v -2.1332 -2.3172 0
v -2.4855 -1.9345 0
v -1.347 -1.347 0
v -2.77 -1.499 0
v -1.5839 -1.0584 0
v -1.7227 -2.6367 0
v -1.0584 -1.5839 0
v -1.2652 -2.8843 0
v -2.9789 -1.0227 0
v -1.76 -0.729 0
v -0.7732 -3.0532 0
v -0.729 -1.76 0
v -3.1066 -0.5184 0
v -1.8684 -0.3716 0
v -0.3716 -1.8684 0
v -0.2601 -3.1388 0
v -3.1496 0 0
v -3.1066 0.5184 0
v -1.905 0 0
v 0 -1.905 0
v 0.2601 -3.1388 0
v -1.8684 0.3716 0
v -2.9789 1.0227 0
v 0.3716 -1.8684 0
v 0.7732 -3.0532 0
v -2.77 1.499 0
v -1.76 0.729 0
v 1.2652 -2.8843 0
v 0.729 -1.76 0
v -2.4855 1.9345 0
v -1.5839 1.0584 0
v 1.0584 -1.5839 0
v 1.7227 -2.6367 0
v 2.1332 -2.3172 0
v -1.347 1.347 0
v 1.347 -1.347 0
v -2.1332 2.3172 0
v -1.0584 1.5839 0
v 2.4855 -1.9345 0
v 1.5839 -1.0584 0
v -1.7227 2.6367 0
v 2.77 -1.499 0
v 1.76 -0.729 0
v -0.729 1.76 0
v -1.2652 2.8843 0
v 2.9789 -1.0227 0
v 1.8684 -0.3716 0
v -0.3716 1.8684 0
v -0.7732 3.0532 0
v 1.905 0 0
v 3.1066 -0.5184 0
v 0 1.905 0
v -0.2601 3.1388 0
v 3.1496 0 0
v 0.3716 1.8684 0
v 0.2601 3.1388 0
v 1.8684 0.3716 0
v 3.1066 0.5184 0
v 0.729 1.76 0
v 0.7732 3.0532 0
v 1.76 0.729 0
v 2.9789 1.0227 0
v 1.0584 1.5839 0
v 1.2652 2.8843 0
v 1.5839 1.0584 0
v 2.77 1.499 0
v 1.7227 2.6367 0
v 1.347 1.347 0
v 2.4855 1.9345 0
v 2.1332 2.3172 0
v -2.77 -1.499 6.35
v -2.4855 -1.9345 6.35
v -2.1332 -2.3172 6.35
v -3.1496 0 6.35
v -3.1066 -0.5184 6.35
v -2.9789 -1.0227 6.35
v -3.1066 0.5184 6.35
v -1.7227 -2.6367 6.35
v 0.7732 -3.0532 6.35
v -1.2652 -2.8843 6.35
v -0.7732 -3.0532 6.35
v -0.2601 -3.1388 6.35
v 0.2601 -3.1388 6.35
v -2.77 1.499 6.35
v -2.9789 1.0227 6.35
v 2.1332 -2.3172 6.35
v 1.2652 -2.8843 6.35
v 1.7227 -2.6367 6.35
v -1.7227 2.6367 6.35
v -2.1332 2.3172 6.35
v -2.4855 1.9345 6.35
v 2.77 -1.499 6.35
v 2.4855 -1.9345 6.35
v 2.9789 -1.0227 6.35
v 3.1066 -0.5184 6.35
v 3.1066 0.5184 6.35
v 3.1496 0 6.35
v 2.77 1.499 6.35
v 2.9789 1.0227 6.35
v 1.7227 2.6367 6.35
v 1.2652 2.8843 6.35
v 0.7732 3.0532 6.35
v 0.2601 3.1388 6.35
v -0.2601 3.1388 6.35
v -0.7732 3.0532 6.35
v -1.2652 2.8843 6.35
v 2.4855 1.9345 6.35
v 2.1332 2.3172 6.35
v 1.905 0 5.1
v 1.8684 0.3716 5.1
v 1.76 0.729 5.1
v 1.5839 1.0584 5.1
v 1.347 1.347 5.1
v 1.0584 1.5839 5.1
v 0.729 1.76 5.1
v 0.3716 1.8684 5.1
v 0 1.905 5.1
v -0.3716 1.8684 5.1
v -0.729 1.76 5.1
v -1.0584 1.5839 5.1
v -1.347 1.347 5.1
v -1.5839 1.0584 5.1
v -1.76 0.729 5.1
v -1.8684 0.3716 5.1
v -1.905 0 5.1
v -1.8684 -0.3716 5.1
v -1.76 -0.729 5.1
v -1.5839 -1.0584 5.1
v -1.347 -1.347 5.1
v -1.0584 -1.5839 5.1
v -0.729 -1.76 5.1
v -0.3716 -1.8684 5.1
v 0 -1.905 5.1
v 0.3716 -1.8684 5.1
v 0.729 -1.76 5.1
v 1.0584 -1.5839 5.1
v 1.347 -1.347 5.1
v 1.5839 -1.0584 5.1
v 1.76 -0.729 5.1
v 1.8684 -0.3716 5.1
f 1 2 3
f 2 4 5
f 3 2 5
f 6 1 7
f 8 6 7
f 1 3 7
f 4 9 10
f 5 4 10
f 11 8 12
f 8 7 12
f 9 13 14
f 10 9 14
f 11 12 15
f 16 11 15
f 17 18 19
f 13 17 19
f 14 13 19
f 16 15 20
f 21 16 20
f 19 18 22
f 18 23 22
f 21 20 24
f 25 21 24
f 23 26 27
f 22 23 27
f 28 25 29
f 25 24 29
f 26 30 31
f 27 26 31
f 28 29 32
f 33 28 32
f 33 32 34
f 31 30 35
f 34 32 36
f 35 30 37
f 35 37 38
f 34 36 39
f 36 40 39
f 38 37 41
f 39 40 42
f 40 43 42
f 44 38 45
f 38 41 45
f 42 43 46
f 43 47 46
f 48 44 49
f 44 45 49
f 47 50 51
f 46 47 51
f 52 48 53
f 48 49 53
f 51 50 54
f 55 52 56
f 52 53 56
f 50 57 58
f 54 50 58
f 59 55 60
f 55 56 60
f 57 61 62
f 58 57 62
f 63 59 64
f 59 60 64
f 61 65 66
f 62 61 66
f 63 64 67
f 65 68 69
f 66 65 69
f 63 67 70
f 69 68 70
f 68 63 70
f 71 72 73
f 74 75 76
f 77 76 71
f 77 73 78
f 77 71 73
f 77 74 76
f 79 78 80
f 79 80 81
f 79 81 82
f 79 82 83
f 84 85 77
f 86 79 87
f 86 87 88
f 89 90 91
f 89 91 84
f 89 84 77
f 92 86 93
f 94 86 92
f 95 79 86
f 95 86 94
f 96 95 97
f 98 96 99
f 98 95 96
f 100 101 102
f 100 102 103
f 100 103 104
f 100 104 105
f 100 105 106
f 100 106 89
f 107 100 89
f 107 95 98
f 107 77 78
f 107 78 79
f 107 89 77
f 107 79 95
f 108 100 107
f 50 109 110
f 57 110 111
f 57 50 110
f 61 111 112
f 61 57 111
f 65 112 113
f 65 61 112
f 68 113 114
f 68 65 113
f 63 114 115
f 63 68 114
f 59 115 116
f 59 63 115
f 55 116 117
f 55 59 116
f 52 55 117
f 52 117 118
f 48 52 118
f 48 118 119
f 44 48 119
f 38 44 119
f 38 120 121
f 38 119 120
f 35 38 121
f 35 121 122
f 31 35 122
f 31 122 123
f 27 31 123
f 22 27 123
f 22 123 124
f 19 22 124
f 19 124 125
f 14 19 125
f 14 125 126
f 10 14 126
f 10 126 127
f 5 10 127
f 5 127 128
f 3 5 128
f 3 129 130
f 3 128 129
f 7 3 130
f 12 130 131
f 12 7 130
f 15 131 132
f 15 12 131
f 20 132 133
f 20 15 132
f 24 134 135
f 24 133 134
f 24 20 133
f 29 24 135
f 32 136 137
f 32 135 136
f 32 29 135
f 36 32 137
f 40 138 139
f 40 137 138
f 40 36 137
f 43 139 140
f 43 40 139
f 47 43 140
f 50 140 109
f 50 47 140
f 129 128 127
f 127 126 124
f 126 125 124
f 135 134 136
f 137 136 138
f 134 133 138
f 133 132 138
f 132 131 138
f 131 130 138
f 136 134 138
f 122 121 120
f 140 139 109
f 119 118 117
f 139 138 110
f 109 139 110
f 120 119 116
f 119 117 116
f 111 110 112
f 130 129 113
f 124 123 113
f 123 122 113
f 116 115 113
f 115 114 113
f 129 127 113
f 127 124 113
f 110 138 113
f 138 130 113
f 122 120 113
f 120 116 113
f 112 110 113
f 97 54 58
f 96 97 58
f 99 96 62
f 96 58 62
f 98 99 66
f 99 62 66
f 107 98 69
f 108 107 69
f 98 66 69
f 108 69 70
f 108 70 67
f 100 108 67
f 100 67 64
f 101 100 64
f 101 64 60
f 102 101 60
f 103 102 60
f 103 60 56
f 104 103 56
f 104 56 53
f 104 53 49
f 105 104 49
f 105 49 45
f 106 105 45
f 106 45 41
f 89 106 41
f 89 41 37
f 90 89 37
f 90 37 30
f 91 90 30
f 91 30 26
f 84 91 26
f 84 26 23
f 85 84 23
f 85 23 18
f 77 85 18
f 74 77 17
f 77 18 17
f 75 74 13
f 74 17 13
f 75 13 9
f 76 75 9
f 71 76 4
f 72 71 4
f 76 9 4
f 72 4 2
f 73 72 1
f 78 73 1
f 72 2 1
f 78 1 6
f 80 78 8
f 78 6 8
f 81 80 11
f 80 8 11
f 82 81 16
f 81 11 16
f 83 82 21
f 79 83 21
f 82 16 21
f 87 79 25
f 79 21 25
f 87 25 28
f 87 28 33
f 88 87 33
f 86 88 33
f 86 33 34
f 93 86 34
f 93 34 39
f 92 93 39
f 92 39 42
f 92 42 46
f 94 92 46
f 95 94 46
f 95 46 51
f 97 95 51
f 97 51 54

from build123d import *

# Parameters (mm, degrees)
F0_R     = 3.1496
F0_R_2   = 1.905
F1_DEPTH = 1.778
F2_DEPTH = 6.35
F3_R     = 3.070911
F4_DEPTH = 1.25


with BuildPart() as f1:
    # F0 (on Top) → F1 (new body)
    with BuildSketch(Plane.XY):
        Circle(F0_R)
        Circle(F0_R_2, mode=Mode.SUBTRACT)
    extrude(amount=F1_DEPTH)

    # F0 (on Top) → F2 (join)
    with BuildSketch(Plane.XY):
        Circle(F0_R)
        Circle(F0_R_2, mode=Mode.SUBTRACT)
    extrude(amount=F2_DEPTH)

    # F3 (on face) → F4 (join)
    with BuildSketch(Plane.XY.offset(6.35)):
        Circle(F3_R)
    extrude(amount=-F4_DEPTH)


solid = f1.part
